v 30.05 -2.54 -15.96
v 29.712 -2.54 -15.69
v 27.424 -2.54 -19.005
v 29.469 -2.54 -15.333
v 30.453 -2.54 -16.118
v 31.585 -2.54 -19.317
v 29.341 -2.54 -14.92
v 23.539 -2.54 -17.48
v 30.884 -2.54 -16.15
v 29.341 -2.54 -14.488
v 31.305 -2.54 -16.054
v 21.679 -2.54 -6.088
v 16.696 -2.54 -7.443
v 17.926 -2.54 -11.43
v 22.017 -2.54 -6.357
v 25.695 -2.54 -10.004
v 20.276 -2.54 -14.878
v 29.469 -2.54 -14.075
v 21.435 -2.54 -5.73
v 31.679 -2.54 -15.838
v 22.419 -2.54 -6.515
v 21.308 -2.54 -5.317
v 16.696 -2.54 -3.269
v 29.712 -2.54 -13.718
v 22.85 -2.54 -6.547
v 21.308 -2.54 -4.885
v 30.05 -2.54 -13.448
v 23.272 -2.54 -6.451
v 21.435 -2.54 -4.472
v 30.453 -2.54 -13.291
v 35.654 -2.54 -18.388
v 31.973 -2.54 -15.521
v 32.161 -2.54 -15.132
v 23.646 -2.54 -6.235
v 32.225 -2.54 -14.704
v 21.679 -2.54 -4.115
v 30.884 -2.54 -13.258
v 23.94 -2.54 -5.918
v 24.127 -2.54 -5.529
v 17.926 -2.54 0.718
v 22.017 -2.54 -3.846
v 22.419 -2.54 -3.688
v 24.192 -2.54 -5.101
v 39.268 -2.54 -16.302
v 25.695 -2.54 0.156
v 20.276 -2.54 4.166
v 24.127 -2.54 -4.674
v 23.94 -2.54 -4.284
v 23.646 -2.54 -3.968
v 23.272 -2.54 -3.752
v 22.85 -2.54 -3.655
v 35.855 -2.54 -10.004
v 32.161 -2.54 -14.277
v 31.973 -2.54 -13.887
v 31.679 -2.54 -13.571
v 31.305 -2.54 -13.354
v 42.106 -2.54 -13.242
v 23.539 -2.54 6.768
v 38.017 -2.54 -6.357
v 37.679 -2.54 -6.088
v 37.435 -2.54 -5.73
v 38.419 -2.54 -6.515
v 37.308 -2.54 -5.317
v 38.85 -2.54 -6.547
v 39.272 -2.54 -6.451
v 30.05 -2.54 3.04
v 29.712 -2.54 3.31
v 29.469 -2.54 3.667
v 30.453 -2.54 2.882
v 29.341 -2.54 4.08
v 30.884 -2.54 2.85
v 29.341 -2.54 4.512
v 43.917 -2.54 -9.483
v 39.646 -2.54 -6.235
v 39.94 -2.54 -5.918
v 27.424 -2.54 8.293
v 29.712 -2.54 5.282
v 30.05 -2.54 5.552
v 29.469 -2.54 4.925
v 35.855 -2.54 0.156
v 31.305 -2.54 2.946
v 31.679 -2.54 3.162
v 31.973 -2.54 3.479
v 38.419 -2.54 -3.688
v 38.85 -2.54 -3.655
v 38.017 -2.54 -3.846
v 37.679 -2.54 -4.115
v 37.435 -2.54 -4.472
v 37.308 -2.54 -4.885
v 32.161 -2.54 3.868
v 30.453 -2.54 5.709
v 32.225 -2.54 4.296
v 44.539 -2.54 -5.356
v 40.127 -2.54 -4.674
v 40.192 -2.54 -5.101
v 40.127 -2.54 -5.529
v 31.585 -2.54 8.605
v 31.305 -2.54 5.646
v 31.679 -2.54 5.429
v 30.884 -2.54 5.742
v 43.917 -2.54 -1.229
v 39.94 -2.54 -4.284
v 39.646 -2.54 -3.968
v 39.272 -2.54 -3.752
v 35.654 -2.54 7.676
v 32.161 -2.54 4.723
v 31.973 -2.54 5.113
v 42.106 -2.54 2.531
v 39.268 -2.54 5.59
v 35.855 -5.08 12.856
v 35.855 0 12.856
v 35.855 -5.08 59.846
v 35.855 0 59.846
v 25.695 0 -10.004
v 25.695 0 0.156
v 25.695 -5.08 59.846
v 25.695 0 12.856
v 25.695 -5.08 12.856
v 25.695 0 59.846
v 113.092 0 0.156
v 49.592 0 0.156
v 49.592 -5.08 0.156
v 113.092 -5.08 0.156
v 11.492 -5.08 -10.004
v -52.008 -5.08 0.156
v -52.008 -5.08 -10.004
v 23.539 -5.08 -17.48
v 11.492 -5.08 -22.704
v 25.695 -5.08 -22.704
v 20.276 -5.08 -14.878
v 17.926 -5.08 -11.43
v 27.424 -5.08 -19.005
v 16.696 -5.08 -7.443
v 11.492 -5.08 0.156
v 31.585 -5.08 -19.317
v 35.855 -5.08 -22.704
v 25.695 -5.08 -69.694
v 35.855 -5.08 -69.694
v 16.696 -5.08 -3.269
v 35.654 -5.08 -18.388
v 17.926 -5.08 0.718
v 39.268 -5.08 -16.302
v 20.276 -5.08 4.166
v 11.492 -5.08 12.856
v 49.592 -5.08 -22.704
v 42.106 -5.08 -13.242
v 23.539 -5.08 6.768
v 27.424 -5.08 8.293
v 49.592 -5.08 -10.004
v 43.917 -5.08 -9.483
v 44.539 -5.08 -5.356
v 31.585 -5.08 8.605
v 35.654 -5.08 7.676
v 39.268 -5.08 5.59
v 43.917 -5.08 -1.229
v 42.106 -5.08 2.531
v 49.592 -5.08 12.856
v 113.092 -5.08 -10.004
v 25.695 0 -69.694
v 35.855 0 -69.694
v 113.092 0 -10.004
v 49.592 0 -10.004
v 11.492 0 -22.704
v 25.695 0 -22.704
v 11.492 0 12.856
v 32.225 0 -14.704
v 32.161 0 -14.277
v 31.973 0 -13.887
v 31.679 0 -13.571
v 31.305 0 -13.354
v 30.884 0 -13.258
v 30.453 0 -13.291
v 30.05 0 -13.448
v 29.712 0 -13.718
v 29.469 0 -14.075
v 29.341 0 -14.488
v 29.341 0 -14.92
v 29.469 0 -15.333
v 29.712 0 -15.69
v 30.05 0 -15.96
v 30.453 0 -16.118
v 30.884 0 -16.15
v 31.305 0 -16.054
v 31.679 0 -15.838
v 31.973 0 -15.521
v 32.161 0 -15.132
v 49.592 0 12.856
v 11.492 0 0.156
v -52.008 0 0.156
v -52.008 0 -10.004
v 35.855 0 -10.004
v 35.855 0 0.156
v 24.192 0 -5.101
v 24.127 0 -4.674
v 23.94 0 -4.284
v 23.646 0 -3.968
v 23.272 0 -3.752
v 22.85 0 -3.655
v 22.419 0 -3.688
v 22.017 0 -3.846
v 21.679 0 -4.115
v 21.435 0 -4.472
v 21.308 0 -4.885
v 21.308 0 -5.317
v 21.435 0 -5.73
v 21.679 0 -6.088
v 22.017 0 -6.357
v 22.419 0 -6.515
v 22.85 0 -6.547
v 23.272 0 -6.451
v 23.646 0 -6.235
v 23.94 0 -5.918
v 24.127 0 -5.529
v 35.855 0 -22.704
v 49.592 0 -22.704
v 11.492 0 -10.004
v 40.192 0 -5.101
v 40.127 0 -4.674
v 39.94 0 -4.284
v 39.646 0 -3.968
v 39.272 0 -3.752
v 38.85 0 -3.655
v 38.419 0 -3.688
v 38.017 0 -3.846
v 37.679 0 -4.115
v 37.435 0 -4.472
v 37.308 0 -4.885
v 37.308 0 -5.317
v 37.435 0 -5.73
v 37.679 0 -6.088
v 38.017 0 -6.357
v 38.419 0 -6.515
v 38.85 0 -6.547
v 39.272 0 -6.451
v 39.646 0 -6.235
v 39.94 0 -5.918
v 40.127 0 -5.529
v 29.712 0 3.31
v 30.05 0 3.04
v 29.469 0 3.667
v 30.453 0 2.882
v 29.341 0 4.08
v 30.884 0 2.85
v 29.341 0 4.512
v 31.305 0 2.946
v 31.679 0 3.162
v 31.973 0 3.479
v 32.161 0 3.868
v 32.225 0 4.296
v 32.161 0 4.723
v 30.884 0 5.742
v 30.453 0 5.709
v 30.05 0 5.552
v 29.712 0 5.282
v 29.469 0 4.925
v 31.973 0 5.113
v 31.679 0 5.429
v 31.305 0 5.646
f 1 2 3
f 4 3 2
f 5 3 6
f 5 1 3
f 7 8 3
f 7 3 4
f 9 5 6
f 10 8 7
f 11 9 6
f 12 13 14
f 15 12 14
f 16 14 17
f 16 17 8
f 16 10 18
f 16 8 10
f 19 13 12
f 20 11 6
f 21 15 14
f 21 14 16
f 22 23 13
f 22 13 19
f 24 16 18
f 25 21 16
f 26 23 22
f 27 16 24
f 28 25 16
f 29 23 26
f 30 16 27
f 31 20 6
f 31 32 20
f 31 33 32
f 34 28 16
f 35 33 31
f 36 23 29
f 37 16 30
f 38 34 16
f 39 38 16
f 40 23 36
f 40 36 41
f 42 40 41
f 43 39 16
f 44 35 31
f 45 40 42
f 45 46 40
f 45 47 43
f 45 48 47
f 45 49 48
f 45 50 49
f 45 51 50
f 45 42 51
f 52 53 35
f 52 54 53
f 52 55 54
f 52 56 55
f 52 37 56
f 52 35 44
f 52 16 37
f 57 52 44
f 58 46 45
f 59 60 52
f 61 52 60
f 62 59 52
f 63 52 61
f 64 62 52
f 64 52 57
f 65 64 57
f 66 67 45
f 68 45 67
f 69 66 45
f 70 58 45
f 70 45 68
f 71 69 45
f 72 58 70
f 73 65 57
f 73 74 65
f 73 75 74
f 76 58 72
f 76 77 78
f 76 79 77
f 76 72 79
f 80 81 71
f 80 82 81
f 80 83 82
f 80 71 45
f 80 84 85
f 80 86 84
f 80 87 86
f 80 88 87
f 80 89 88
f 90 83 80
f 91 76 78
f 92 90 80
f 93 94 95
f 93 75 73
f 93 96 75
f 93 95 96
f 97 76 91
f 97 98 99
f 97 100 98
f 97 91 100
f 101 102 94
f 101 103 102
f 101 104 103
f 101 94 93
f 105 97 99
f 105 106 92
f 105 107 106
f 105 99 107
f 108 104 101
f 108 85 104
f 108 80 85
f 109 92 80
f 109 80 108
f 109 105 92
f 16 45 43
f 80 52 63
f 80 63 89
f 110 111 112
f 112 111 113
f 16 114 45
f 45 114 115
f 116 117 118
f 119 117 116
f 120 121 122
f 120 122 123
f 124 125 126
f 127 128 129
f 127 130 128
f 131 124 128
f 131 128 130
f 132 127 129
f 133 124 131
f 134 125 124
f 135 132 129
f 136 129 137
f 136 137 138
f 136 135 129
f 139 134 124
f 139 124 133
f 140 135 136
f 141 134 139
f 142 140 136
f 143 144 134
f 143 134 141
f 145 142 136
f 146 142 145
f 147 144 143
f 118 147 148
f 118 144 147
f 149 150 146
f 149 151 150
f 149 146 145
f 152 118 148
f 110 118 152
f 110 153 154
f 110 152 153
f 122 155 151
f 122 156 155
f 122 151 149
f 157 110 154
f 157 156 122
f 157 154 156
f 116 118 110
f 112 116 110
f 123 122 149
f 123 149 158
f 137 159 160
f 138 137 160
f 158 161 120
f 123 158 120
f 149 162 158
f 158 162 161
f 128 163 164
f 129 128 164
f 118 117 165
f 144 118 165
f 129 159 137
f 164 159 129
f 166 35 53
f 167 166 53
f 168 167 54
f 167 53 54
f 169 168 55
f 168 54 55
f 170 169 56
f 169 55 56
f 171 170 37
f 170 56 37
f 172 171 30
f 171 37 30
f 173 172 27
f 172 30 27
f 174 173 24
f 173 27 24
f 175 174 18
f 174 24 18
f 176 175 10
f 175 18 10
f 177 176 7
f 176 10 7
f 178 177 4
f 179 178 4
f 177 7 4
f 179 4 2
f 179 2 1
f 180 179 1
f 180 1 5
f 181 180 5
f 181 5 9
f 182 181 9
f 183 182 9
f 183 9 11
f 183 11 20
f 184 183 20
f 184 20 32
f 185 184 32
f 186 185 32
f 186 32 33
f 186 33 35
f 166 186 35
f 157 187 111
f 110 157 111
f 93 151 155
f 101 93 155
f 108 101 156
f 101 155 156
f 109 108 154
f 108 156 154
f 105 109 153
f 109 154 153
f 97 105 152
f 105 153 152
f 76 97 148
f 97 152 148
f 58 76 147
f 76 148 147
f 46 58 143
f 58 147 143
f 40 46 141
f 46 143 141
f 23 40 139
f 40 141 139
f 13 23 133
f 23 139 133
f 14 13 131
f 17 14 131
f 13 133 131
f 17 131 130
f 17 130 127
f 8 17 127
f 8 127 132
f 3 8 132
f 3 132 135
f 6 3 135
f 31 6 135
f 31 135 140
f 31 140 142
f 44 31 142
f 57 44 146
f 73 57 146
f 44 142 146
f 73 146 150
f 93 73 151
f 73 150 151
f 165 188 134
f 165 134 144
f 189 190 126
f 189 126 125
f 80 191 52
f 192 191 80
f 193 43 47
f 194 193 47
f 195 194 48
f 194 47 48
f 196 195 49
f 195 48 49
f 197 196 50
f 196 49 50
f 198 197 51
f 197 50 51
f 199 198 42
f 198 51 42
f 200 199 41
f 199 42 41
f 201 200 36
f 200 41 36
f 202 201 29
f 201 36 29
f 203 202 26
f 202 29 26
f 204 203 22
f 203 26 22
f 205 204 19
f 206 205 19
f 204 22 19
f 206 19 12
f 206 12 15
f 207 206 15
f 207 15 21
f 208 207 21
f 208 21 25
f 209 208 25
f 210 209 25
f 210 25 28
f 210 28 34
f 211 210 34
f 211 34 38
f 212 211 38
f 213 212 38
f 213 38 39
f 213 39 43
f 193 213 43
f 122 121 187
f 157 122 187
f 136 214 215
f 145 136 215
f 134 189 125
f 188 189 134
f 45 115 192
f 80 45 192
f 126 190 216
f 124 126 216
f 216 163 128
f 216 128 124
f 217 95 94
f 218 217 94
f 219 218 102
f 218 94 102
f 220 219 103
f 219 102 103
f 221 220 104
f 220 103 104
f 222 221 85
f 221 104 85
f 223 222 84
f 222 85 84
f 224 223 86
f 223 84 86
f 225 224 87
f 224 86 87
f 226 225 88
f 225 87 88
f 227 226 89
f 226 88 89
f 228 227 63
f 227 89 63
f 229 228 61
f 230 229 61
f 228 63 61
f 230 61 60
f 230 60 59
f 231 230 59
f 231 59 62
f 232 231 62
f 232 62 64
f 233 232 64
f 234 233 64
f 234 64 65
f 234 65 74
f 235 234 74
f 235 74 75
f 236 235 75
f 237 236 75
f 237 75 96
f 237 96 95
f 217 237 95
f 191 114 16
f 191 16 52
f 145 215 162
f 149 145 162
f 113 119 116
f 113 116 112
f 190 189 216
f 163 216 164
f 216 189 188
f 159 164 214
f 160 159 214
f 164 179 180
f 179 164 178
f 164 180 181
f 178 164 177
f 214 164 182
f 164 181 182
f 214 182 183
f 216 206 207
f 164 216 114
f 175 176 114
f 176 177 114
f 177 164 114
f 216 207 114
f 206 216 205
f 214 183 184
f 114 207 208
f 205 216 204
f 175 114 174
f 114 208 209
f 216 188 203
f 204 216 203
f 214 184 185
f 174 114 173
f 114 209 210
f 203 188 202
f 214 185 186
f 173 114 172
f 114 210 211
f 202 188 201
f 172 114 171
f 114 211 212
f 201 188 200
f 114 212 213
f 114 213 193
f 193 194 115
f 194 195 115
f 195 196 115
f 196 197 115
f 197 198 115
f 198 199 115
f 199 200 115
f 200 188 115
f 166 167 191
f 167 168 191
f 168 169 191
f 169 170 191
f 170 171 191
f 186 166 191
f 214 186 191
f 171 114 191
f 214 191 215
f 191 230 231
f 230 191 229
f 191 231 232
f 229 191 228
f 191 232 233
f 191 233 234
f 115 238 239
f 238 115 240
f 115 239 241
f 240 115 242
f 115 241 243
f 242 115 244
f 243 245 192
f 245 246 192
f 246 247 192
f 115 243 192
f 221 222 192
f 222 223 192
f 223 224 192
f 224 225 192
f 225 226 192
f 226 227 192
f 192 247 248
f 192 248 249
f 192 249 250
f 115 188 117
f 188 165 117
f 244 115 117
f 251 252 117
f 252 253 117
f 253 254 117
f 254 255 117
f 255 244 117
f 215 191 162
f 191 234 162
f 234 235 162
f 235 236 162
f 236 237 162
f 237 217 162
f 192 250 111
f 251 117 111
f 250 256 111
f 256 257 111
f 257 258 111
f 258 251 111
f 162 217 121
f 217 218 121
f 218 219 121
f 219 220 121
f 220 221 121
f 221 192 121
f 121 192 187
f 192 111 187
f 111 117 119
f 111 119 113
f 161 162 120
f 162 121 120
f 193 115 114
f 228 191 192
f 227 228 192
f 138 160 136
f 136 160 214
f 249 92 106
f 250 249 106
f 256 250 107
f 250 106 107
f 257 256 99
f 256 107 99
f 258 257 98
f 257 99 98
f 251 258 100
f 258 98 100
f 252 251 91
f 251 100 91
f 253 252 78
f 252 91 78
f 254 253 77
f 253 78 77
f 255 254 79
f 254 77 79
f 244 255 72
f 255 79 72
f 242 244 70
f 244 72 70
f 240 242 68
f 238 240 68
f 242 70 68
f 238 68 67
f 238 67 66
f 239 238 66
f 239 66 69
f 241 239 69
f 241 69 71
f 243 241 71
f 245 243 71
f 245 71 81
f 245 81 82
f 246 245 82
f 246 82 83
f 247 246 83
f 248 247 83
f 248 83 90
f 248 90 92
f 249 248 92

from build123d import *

# Parameters (mm, degrees)
F0_W     = 63.5
F0_H     = 10.16
F0_W_2   = 14.2032613265
F0_H_2   = 12.7
F0_W_3   = 10.16
F0_W_4   = 13.7367386735
F0_H_3   = 46.99
F1_DEPTH = 5.08
F2_R     = 14
F3_DEPTH = 2.54
F4_R     = 1.45
F4_R_2   = 2.5
F5_DEPTH = 25.4


with BuildPart() as f1:
    # F0 (on Front) → F1 (new body)
    with BuildSketch(Plane.XZ):
        with Locations((-20.2580714928, -4.9235147662)):
            Rectangle(F0_W, F0_H)
        with Locations((18.5935591704, 6.5064852338)):
            Rectangle(F0_W_2, F0_H_2)
        with Locations((18.5935591704, -4.9235147662)):
            Rectangle(F0_W_2, F0_H)
        with Locations((30.7751898336, 6.5064852338)):
            Rectangle(F0_W_3, F0_H_2)
        with Locations((18.5935591704, -16.3535147662)):
            Rectangle(F0_W_2, F0_H_2)
        with Locations((42.7235591704, 6.5064852338)):
            Rectangle(F0_W_4, F0_H_2)
        with Locations((42.7235591704, -4.9235147662)):
            Rectangle(F0_W_4, F0_H)
        with Locations((30.7751898336, 36.3514852338)):
            Rectangle(F0_W_3, F0_H_3)
        with Locations((30.7751898336, -16.3535147662)):
            Rectangle(F0_W_3, F0_H_2)
        with Locations((81.3419285072, -4.9235147662)):
            Rectangle(F0_W, F0_H)
        with Locations((42.7235591704, -16.3535147662)):
            Rectangle(F0_W_4, F0_H_2)
        with Locations((30.7751898336, -46.1985147662)):
            Rectangle(F0_W_3, F0_H_3)
    extrude(amount=F1_DEPTH)

    # F2 (on face) → F3 (cut)
    with BuildSketch(Plane.XZ.offset(5.08)):
        with Locations((30.5391428791, -5.3559371654)):
            Circle(F2_R)
    extrude(amount=-F3_DEPTH, mode=Mode.SUBTRACT)

    # F4 (on face) → F5 (cut)
    with BuildSketch(Plane.XZ.offset(2.54)):
        with Locations((38.7418020368, -5.1013086922)):
            Circle(F4_R)
        with Locations((22.7418020368, -5.1013086922)):
            Circle(F4_R)
        with Locations((30.7751898336, -14.7041610032)):
            Circle(F4_R)
        with Locations((30.7751898336, 4.2958389968)):
            Circle(F4_R)
        with Locations((30.5391428791, -5.3559371654)):
            Circle(F4_R_2)
    extrude(amount=-F5_DEPTH, mode=Mode.SUBTRACT)


solid = f1.part
